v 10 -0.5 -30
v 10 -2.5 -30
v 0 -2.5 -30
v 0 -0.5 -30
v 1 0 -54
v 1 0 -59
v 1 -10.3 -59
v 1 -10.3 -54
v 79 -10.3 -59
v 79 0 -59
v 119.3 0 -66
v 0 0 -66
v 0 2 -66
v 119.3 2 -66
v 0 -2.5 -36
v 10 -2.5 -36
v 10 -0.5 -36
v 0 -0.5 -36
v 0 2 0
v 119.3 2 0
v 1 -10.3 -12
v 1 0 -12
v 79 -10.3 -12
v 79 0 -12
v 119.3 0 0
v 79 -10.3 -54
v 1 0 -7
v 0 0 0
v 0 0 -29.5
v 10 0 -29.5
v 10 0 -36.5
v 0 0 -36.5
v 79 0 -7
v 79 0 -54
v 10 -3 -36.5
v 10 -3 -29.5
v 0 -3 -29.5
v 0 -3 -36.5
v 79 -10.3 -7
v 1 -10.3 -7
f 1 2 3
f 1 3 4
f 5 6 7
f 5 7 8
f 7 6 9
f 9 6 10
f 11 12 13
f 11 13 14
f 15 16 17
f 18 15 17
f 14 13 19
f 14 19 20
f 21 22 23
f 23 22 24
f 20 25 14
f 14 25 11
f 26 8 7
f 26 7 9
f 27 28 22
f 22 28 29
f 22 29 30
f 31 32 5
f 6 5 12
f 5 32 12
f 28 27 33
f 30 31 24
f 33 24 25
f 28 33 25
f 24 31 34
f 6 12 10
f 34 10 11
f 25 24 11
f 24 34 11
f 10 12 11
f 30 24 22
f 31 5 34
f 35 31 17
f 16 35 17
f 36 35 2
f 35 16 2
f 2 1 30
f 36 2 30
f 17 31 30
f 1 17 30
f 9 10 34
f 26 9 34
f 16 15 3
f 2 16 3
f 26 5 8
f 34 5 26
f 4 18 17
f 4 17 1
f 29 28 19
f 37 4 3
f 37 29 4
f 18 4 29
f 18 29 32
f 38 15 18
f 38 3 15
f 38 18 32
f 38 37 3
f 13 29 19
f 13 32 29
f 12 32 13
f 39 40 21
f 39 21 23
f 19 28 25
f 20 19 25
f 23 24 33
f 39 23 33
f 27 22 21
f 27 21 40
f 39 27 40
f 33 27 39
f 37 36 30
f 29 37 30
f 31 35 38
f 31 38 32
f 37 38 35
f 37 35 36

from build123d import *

# Parameters (mm, degrees)
SKETCH_1_W      = 119.3
SKETCH_1_H      = 66
EXTRUDE_1_DEPTH = 2
SKETCH_2_W      = 78
SKETCH_2_H      = 5
EXTRUDE_2_DEPTH = 10.3
SKETCH_3_W      = 7
SKETCH_3_H      = 3
SKETCH_3_W_2    = 6
SKETCH_3_H_2    = 2
EXTRUDE_3_DEPTH = 10


with BuildPart() as part:
    # Эскиз1 → Бобышка-Вытянуть1 (new body)
    with BuildSketch(Plane(origin=(0, 0, 0), x_dir=(1, 0, 0), z_dir=(0, 1, 0))):
        with Locations((59.65, 33)):
            Rectangle(SKETCH_1_W, SKETCH_1_H)
    extrude(amount=EXTRUDE_1_DEPTH)

    # Эскиз2 → Бобышка-Вытянуть2 (add)
    with BuildSketch(Plane.XZ):
        with Locations((40, -9.5)):
            Rectangle(SKETCH_2_W, SKETCH_2_H)
        with Locations((40, -56.5)):
            Rectangle(SKETCH_2_W, SKETCH_2_H)
    extrude(amount=EXTRUDE_2_DEPTH)

    # Эскиз3 → Бобышка-Вытянуть3 (add)
    with BuildSketch(Plane.ZY):
        with Locations((-33, -1.5)):
            Rectangle(SKETCH_3_W, SKETCH_3_H)
        with Locations((-33, -1.5)):
            Rectangle(SKETCH_3_W_2, SKETCH_3_H_2, mode=Mode.SUBTRACT)
    extrude(amount=-EXTRUDE_3_DEPTH)


solid = part.part
